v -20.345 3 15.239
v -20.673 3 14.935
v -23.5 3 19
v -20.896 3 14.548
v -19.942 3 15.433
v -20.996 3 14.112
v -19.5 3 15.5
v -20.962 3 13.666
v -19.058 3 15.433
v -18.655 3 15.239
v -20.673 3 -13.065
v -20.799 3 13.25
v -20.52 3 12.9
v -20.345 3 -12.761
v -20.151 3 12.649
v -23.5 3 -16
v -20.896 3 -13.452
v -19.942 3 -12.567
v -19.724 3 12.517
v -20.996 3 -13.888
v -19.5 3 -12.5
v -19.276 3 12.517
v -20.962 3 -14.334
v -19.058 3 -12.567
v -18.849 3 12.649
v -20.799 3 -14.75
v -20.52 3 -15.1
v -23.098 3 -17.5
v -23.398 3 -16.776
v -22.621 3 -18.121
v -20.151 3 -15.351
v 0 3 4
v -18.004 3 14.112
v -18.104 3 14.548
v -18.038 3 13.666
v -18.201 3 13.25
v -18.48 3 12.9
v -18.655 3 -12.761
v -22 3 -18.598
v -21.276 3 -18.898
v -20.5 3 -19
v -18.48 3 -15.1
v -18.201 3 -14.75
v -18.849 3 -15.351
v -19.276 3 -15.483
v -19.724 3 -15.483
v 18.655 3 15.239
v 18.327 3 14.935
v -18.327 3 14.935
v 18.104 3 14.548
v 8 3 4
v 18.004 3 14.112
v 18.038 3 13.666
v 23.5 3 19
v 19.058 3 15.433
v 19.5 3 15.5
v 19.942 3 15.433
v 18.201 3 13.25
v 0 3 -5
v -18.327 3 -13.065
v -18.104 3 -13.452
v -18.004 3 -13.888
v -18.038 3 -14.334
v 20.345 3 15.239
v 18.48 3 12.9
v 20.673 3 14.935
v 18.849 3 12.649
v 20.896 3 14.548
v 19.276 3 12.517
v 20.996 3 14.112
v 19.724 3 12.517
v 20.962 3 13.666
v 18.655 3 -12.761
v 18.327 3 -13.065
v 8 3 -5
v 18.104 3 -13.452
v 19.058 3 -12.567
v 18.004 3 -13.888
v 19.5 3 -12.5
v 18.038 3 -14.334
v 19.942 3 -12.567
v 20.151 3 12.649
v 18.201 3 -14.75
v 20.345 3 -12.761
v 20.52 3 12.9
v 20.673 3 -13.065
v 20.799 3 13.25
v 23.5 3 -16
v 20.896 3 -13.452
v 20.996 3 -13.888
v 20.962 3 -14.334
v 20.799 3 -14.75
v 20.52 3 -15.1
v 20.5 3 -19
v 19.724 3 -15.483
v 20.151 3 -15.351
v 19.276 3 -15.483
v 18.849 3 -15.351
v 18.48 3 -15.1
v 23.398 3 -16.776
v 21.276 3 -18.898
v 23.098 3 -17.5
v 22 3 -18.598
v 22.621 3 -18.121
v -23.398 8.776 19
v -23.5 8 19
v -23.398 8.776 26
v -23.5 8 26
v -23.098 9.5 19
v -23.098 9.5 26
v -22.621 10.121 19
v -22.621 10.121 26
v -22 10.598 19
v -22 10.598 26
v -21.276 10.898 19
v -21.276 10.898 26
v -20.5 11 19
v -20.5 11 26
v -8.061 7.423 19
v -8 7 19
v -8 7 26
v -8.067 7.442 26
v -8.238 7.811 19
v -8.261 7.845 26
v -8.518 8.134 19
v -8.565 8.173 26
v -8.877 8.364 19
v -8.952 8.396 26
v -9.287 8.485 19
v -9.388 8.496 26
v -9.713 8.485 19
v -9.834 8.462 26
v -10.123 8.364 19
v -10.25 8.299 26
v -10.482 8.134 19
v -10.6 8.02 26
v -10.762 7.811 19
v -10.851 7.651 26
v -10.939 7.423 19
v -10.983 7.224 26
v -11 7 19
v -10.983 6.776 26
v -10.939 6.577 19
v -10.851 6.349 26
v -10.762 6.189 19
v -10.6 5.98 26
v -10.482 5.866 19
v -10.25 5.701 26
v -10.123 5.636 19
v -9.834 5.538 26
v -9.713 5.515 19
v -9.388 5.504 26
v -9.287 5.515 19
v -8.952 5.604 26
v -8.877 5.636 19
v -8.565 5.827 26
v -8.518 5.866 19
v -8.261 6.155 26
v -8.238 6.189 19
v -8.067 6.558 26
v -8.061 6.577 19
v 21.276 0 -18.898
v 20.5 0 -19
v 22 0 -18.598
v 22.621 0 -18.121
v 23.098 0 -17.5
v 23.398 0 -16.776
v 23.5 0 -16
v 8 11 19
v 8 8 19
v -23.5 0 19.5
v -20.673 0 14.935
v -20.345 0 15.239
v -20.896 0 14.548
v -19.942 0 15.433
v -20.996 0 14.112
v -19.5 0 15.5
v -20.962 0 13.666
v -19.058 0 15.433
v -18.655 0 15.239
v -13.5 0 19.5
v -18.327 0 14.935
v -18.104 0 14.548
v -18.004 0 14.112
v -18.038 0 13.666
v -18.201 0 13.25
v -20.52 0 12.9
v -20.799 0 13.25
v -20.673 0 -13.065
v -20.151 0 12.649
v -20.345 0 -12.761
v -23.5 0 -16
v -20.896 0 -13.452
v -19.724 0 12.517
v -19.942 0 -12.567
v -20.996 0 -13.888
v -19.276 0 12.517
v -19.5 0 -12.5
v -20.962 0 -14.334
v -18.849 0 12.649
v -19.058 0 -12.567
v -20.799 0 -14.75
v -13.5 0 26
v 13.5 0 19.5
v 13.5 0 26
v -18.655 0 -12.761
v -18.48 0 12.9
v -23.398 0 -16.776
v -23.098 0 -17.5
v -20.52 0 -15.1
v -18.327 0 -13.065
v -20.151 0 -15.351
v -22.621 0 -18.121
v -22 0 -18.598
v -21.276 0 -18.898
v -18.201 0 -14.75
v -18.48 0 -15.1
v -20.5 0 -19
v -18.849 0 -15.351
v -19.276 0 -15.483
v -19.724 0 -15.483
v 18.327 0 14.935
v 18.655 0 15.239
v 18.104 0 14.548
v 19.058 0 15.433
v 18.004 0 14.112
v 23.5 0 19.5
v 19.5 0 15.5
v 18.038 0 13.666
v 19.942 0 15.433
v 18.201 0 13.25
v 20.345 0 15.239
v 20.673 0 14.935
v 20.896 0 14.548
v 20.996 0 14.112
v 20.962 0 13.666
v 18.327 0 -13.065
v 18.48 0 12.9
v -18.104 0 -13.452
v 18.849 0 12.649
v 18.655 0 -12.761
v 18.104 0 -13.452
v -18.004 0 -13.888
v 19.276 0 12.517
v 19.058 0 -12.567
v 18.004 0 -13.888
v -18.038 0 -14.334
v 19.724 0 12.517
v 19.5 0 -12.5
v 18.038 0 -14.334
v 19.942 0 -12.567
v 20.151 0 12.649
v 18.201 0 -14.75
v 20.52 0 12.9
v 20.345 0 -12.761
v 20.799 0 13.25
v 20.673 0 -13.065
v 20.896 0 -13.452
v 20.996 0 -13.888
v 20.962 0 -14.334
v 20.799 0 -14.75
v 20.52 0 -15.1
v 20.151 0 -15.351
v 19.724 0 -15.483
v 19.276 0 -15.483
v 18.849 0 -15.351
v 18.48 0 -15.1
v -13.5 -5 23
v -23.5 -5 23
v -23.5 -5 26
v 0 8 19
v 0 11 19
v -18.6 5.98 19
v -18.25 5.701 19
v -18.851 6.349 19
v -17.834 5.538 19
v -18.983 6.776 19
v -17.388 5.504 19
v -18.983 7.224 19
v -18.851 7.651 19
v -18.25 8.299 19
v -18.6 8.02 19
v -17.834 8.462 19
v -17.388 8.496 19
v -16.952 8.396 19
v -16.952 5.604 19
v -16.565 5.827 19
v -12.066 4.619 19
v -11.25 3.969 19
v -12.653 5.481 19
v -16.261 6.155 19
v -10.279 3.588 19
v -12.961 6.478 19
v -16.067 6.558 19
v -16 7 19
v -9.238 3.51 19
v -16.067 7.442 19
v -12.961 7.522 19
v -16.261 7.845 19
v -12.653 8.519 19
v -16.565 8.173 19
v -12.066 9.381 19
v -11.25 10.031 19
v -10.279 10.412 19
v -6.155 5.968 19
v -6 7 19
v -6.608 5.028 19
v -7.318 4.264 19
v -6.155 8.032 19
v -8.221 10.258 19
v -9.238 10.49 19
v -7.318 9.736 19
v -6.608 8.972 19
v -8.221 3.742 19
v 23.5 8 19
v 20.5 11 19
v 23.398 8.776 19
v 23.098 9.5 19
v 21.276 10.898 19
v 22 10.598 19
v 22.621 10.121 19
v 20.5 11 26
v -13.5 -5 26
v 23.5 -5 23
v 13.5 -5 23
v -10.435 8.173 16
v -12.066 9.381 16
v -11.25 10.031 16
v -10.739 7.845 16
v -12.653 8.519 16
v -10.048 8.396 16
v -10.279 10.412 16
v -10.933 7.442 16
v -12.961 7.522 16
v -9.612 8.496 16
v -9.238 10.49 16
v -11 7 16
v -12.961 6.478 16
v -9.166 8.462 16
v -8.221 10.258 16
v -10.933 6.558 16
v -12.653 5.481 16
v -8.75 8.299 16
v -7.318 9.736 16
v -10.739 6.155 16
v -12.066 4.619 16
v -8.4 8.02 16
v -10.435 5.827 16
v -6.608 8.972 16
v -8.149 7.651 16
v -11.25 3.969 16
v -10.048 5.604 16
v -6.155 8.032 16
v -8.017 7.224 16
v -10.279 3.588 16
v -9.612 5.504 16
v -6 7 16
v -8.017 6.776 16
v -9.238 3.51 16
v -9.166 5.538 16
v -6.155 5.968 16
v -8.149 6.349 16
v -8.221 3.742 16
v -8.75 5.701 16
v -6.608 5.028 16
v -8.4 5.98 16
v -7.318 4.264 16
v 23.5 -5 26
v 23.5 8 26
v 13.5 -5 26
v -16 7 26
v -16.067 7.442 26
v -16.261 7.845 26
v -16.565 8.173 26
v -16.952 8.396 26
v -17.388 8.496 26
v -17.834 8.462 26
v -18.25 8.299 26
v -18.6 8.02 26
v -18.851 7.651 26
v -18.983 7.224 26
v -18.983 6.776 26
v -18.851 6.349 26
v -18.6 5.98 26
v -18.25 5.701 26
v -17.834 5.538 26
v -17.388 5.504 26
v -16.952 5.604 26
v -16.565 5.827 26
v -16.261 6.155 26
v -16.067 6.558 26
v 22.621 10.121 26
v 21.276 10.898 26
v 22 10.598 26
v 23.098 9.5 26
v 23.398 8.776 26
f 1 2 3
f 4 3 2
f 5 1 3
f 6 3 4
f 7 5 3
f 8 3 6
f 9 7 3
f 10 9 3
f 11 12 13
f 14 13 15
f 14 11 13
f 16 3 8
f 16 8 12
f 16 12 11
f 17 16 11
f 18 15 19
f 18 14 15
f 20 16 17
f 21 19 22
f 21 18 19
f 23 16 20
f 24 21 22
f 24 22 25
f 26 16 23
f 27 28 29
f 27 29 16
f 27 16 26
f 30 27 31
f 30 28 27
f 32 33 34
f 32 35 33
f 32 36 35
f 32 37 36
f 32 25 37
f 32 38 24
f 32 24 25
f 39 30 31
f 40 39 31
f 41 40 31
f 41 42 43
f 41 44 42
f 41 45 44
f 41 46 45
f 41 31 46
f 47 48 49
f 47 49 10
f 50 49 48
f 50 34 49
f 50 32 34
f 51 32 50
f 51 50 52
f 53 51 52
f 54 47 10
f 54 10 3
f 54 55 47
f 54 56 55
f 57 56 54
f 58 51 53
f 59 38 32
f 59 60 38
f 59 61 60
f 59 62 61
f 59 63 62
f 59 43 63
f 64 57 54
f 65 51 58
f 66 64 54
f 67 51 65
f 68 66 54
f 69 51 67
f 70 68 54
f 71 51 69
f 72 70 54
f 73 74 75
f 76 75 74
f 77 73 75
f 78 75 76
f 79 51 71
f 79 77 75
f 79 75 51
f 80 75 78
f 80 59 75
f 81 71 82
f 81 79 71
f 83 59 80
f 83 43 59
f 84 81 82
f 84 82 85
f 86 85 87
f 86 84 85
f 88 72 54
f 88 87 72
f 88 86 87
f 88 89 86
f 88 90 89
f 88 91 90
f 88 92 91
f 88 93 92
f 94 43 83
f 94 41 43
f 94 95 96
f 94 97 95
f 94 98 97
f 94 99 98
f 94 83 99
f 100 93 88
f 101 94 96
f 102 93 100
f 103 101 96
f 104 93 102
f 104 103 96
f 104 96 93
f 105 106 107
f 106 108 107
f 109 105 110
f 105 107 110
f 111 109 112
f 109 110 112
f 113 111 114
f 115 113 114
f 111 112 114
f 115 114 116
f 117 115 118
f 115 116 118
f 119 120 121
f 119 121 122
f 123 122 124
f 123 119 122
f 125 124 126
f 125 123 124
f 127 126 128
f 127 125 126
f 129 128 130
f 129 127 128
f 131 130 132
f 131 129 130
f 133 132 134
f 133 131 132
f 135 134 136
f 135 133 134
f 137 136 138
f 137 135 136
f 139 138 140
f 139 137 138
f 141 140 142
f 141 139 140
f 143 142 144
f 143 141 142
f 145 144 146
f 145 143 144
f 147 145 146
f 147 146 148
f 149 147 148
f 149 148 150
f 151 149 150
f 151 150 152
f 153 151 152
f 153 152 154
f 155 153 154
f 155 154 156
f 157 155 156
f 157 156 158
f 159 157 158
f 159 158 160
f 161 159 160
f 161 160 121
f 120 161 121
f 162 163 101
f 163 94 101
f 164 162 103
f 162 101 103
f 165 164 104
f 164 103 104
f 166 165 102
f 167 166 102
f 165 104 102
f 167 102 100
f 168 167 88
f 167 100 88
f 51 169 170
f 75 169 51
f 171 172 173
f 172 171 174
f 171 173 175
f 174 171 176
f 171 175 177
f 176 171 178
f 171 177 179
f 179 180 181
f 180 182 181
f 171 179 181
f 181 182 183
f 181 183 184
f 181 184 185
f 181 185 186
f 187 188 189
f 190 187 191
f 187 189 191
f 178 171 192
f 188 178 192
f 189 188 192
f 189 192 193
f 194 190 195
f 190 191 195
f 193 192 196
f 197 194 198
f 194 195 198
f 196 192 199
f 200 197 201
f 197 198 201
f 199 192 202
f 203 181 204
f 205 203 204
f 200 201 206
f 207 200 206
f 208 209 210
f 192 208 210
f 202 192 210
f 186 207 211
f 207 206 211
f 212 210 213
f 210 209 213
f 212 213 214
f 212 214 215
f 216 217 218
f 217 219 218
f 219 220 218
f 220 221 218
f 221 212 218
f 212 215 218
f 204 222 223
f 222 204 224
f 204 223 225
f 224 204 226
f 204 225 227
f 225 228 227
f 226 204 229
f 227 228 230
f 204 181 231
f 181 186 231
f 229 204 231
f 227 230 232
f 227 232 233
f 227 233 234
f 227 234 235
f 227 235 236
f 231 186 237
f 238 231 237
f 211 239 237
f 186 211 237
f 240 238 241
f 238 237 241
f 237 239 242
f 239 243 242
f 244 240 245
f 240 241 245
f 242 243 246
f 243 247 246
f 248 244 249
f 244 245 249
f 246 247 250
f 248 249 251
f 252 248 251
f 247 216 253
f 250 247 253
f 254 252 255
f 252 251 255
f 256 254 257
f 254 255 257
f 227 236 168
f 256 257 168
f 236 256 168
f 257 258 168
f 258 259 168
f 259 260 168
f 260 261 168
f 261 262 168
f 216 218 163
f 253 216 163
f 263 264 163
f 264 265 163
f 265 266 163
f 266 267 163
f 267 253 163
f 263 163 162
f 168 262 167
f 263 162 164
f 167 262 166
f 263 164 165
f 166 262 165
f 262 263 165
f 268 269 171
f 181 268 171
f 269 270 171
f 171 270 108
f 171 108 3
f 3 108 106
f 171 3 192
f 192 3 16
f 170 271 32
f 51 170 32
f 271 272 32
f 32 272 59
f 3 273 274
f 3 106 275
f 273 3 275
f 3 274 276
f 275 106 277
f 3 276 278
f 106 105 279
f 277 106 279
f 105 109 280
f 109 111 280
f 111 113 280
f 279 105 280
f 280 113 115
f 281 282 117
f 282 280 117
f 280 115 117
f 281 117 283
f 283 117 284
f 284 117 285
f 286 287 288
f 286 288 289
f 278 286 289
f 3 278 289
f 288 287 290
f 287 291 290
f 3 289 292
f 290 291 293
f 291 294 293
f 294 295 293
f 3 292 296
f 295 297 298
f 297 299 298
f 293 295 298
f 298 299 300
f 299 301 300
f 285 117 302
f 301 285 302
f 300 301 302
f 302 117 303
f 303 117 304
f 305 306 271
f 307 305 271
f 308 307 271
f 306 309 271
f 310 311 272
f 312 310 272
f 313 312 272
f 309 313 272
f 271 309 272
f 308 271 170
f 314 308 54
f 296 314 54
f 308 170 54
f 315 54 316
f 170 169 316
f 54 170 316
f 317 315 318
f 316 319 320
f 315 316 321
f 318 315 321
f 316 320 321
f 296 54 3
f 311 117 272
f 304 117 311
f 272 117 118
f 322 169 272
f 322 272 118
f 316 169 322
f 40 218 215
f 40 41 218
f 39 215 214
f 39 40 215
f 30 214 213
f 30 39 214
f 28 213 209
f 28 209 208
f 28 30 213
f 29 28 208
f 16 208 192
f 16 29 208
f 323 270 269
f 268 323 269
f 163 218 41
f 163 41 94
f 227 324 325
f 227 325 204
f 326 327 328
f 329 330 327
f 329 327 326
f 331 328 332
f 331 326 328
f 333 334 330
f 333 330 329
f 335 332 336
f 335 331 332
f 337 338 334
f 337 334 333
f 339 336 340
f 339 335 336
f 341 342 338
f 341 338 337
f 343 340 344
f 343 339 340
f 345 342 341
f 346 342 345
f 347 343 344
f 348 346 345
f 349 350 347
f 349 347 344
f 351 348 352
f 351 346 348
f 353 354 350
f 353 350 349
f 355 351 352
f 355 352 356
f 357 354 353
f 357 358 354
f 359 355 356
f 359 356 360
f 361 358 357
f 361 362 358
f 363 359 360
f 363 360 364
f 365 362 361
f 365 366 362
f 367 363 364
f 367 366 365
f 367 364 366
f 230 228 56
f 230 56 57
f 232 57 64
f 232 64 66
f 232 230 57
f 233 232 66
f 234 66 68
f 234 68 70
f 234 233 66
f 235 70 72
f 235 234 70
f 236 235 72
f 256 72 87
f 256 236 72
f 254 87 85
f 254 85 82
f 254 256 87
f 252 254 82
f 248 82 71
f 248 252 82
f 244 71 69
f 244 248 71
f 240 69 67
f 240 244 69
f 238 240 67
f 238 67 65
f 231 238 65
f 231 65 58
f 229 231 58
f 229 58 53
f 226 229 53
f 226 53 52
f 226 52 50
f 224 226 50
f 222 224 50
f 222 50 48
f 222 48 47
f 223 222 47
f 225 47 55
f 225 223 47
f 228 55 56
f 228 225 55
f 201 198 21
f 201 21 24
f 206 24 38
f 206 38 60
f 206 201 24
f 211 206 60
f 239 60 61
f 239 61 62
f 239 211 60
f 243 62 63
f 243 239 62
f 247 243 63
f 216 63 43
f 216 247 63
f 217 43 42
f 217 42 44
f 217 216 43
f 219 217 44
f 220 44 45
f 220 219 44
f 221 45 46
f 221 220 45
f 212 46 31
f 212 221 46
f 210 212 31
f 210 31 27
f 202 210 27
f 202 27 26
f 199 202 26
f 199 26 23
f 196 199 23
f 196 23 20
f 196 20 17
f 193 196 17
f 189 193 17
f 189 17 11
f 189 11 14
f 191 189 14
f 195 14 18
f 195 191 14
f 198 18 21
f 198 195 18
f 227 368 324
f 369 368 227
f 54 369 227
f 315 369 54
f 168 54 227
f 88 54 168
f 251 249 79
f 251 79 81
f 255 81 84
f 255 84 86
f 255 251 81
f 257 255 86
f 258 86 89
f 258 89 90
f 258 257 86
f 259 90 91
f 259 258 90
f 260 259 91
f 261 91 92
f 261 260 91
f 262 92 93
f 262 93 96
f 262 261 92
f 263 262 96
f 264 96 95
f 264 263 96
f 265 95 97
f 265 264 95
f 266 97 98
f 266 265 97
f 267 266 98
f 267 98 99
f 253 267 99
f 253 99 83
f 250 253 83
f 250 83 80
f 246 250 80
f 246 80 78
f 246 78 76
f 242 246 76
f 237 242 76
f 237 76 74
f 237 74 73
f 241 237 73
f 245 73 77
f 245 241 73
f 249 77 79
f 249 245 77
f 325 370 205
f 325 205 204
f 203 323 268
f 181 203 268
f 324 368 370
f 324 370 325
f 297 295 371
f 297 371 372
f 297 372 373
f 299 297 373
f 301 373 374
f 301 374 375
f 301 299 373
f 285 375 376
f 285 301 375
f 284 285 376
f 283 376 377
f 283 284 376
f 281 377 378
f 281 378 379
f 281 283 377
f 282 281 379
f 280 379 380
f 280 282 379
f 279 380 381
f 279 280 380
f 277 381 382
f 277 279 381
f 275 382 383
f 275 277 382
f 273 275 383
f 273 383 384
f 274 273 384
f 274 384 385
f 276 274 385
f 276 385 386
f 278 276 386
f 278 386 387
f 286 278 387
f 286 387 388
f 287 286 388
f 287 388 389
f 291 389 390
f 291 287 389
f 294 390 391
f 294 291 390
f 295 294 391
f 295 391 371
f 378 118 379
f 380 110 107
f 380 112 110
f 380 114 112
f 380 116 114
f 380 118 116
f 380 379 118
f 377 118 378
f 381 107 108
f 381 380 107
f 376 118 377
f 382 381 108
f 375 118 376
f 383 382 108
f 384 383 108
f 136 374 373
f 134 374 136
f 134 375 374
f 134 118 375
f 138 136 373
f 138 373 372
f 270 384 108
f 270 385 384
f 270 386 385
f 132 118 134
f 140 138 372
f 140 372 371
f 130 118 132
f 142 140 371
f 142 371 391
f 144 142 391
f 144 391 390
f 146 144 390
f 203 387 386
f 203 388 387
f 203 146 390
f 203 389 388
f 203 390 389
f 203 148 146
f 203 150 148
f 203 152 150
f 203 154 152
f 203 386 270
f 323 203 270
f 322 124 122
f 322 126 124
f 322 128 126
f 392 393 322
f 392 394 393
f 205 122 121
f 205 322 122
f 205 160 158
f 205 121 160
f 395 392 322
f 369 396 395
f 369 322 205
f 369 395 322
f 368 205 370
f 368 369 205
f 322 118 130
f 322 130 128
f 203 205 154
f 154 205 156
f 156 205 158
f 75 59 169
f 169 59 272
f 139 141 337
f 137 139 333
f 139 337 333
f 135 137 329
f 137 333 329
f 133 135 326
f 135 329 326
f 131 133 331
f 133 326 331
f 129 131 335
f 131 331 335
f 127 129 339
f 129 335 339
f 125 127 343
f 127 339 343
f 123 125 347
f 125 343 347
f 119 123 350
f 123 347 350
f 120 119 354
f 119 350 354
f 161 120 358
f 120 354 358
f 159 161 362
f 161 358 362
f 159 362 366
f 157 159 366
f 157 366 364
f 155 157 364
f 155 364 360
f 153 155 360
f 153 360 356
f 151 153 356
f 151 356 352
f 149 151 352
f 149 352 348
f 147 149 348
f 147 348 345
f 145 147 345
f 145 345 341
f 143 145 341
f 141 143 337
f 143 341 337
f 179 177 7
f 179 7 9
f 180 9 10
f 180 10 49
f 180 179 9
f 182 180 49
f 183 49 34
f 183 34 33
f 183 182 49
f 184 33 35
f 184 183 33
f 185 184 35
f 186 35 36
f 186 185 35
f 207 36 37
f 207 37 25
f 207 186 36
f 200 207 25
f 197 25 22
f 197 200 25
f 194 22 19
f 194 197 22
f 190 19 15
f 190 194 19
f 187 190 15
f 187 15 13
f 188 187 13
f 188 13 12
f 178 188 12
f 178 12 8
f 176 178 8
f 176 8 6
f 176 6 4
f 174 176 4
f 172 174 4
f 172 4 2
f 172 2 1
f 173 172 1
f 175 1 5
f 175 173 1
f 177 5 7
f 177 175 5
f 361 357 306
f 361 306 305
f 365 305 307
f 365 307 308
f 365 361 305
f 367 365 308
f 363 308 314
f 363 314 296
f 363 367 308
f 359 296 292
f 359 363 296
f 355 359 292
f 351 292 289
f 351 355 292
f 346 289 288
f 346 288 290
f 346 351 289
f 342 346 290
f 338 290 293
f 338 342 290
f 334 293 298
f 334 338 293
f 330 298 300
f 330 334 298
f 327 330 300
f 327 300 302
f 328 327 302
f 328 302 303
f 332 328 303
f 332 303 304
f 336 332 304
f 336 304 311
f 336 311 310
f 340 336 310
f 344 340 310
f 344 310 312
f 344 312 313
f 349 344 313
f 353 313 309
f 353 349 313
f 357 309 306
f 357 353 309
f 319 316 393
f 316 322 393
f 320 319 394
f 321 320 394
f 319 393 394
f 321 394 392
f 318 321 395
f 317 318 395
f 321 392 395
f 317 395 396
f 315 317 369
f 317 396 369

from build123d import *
from build123d.topology import SkipClean

# Parameters (mm, degrees)
SKETCH_1_W      = 47
SKETCH_1_H      = 38
SKETCH_1_R      = 1.5
EXTRUDE_1_DEPTH = 3
SKETCH_2_W      = 47
SKETCH_2_H      = 11
SKETCH_2_R      = 1.5
EXTRUDE_2_DEPTH = 7
EXTRUDE_3_DEPTH = 8
FILLET_4_R      = 3
EXTRUDE_4_DEPTH = 10
FILLET_6_R      = 3
EXTRUDE_START   = 3
SKETCH_7_R      = 3.5
SKETCH_7_R_2    = 1.5
EXTRUDE_5_DEPTH = 3


with BuildPart() as part:
    # 草图1 → 凸台-拉伸1 (new body)
    with BuildSketch(Plane(origin=(0, 0, 0), x_dir=(1, 0, 0), z_dir=(0, 1, 0))):
        Rectangle(SKETCH_1_W, SKETCH_1_H)
        with Locations(Location((19.5, 14, 0), (0, 0, 270))):
            Circle(SKETCH_1_R, mode=Mode.SUBTRACT)
        with Locations(Location((19.5, -14, 0), (0, 0, 270))):
            Circle(SKETCH_1_R, mode=Mode.SUBTRACT)
        with Locations(Location((-19.5, -14, 0), (0, 0, 270))):
            Circle(SKETCH_1_R, mode=Mode.SUBTRACT)
        with Locations(Location((-19.5, 14, 0), (0, 0, 270))):
            Circle(SKETCH_1_R, mode=Mode.SUBTRACT)
    extrude(amount=EXTRUDE_1_DEPTH)

    # 草图2 → 凸台-拉伸2 (add)
    with BuildSketch(Plane.XY.offset(19)):
        with Locations((0, 5.5)):
            Rectangle(SKETCH_2_W, SKETCH_2_H)
        with Locations((-17.5, 7)):
            Circle(SKETCH_2_R, mode=Mode.SUBTRACT)
        with Locations((-9.5, 7)):
            Circle(SKETCH_2_R, mode=Mode.SUBTRACT)
    extrude(amount=EXTRUDE_2_DEPTH)

    # 草图3 → 凸台-拉伸3 (add)
    with BuildSketch(Plane(origin=(0, 0, 0), x_dir=(0, 0, -1), z_dir=(1, 0, 0))):
        Polygon((-19, 11), (-19, 8), (-4, 3), (5, 3), align=None)
    extrude(amount=EXTRUDE_3_DEPTH)

    # 圆角4
    fillet_4_edges = [part.edges().sort_by_distance(p)[0] for p in [
        (-23.5, 11, 22.5),
        (23.5, 11, 22.5),
    ]]
    fillet(fillet_4_edges, radius=FILLET_4_R)

    # 草图4 → 凸台-拉伸4 (add)
    with BuildSketch(Plane.ZY.offset(23.5)):
        Polygon((26, 0), (26, -5), (23, -5), (19.5, 0), align=None)
    extrude_4 = extrude(amount=-EXTRUDE_4_DEPTH)

    # 镜向1: 凸台-拉伸4 across plane
    add(extrude_4.mirror(Plane(origin=(0, 0, 0), x_dir=(0, 0, 1), z_dir=(1, 0, 0))))

    # 圆角6
    fillet_6_edges = [part.edges().sort_by_distance(p)[0] for p in [
        (-23.5, 1.5, -19),
        (23.5, 1.5, -19),
    ]]
    fillet(fillet_6_edges, radius=FILLET_6_R)

    # 草图7 → 凸台-拉伸5 (add)
    with SkipClean():  # the faces are left unmerged after this step: merging them gives an invalid solid
        with BuildSketch(Plane(origin=(0, 0, 19), x_dir=(-1, 0, 0), z_dir=(0, 0, -1)).offset(EXTRUDE_START)):
            with Locations(Location((9.5, 7, 0), (0, 0, 180))):
                Circle(SKETCH_7_R)
            with Locations((9.5, 7)):
                Circle(SKETCH_7_R_2, mode=Mode.SUBTRACT)
        extrude(amount=-EXTRUDE_5_DEPTH)


solid = part.part
